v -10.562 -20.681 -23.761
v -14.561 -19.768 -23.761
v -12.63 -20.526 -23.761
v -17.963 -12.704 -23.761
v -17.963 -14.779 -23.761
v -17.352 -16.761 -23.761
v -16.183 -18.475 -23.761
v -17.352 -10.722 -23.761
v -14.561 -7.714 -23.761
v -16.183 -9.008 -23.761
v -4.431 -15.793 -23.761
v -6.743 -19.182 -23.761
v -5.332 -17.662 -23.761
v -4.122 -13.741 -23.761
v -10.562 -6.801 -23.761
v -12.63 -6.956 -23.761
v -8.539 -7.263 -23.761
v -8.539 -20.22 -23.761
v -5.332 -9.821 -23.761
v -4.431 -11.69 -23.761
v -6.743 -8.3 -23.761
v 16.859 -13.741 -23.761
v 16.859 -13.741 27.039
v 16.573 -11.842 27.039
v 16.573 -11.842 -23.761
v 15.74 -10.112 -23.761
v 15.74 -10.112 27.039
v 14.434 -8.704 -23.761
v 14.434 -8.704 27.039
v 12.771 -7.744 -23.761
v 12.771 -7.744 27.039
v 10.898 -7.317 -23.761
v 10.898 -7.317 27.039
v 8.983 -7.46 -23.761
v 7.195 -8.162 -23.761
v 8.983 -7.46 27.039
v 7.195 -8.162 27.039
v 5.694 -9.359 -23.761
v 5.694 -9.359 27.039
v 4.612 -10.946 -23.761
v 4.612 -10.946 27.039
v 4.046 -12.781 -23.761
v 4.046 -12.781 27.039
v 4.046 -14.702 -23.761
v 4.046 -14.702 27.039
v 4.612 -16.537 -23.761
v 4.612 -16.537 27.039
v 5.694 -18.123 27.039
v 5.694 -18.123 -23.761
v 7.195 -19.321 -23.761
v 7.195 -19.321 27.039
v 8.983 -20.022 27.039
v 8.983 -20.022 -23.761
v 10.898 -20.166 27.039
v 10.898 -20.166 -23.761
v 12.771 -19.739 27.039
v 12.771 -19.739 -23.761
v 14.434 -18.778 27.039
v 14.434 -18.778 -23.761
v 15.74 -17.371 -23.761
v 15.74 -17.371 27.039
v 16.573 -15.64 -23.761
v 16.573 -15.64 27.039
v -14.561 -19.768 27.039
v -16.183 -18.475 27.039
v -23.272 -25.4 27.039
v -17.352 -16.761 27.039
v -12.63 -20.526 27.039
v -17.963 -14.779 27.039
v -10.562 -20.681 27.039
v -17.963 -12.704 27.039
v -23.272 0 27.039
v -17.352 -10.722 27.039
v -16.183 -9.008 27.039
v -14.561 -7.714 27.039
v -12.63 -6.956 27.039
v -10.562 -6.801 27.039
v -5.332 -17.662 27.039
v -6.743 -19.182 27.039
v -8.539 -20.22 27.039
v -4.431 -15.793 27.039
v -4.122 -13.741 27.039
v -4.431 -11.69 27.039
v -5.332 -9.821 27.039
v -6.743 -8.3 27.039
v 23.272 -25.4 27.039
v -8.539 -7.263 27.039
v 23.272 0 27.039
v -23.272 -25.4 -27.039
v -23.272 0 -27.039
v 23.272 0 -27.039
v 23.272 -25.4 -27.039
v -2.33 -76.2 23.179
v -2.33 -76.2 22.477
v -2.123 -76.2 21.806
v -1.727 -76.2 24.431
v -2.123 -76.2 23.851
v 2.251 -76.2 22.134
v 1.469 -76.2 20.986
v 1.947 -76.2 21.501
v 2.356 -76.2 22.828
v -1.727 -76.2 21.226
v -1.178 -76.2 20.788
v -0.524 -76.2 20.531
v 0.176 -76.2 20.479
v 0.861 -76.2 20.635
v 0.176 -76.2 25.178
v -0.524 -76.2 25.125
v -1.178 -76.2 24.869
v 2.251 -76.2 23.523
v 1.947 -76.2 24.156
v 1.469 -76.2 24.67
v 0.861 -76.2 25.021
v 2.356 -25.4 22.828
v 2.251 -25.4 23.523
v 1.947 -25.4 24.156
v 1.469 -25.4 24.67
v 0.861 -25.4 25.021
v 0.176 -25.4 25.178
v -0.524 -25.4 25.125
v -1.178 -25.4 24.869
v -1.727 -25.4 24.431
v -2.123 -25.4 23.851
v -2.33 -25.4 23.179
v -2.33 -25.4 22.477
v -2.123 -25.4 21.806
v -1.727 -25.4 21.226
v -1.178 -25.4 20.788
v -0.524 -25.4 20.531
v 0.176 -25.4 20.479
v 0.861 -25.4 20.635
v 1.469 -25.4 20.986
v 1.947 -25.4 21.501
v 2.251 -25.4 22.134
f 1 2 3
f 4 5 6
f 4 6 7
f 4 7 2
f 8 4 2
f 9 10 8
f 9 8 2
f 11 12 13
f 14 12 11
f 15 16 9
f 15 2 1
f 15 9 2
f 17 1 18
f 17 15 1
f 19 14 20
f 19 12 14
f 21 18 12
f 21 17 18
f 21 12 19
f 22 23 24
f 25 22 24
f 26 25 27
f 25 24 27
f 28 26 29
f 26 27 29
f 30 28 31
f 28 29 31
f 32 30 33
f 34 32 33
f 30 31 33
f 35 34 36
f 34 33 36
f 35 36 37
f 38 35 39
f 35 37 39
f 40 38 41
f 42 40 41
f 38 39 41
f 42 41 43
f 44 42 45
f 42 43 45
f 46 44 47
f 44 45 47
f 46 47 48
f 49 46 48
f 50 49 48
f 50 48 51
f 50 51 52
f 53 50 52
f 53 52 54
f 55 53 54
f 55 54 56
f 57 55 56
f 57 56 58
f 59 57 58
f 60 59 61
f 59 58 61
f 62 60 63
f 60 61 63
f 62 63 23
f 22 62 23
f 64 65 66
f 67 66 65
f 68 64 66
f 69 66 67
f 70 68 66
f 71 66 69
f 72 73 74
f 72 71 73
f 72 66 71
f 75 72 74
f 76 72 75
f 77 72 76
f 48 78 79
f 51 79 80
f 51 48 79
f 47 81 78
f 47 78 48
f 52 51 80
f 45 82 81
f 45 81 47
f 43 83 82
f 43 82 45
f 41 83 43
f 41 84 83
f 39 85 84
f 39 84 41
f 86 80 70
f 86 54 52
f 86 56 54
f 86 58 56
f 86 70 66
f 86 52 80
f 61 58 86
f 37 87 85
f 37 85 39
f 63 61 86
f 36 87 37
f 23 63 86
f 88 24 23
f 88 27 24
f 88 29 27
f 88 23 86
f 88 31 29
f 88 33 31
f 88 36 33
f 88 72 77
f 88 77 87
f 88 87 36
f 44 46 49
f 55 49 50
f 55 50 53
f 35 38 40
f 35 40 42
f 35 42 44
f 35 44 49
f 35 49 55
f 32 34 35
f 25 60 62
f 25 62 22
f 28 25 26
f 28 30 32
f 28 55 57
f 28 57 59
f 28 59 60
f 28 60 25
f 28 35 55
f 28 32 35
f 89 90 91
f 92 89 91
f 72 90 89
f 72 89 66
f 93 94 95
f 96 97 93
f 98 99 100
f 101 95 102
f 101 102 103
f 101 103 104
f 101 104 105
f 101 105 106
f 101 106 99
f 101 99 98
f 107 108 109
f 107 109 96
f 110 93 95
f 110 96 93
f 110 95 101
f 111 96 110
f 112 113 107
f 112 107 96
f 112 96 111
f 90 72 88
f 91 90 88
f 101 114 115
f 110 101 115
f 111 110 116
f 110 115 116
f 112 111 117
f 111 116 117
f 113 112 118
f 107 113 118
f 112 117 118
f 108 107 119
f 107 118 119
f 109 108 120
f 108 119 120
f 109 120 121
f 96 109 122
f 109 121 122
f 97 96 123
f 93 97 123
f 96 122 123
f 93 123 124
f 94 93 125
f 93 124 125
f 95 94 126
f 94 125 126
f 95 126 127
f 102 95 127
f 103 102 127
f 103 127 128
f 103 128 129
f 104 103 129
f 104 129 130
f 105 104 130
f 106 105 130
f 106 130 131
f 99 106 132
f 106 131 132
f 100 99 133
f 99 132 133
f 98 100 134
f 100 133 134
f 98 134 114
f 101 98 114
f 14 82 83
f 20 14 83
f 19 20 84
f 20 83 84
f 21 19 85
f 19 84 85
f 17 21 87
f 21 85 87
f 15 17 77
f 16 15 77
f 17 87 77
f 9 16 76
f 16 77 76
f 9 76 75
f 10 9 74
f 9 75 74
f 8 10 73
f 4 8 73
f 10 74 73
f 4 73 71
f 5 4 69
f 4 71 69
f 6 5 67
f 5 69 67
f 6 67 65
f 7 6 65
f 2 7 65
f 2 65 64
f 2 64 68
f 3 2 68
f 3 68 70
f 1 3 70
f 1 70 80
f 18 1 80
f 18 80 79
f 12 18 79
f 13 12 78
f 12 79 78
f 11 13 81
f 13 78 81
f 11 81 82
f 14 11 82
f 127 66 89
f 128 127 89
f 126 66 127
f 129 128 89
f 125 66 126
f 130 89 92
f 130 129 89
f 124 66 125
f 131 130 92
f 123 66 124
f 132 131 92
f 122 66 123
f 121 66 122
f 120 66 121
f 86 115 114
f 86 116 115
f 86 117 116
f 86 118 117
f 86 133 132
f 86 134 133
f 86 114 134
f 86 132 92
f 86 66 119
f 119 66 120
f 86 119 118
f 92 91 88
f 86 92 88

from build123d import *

# Parameters (mm, degrees)
F0_W     = 46.54321
F0_H     = 54.078784
F1_DEPTH = 25.4
F2_R     = 6.959459
F2_R_2   = 6.442665
F3_DEPTH = 50.8
F4_R     = 2.356005
F5_DEPTH = 50.8


with BuildPart() as f1:
    # F0 (on Front) → F1 (new body)
    with BuildSketch(Plane.XZ):
        Rectangle(F0_W, F0_H)
    extrude(amount=F1_DEPTH)

    # F2 (on face) → F3 (cut)
    with BuildSketch(Plane.XY.offset(27.039392)):
        with Locations((-11.081717, -13.741329)):
            Circle(F2_R)
        with Locations((10.416814, -13.741329)):
            Circle(F2_R_2)
    extrude(amount=-F3_DEPTH, mode=Mode.SUBTRACT)

    # F4 (on face) → F5 (join)
    with BuildSketch(Plane.XZ.offset(25.4)):
        with Locations((0, 22.828339)):
            Circle(F4_R)
    extrude(amount=F5_DEPTH)


solid = f1.part
